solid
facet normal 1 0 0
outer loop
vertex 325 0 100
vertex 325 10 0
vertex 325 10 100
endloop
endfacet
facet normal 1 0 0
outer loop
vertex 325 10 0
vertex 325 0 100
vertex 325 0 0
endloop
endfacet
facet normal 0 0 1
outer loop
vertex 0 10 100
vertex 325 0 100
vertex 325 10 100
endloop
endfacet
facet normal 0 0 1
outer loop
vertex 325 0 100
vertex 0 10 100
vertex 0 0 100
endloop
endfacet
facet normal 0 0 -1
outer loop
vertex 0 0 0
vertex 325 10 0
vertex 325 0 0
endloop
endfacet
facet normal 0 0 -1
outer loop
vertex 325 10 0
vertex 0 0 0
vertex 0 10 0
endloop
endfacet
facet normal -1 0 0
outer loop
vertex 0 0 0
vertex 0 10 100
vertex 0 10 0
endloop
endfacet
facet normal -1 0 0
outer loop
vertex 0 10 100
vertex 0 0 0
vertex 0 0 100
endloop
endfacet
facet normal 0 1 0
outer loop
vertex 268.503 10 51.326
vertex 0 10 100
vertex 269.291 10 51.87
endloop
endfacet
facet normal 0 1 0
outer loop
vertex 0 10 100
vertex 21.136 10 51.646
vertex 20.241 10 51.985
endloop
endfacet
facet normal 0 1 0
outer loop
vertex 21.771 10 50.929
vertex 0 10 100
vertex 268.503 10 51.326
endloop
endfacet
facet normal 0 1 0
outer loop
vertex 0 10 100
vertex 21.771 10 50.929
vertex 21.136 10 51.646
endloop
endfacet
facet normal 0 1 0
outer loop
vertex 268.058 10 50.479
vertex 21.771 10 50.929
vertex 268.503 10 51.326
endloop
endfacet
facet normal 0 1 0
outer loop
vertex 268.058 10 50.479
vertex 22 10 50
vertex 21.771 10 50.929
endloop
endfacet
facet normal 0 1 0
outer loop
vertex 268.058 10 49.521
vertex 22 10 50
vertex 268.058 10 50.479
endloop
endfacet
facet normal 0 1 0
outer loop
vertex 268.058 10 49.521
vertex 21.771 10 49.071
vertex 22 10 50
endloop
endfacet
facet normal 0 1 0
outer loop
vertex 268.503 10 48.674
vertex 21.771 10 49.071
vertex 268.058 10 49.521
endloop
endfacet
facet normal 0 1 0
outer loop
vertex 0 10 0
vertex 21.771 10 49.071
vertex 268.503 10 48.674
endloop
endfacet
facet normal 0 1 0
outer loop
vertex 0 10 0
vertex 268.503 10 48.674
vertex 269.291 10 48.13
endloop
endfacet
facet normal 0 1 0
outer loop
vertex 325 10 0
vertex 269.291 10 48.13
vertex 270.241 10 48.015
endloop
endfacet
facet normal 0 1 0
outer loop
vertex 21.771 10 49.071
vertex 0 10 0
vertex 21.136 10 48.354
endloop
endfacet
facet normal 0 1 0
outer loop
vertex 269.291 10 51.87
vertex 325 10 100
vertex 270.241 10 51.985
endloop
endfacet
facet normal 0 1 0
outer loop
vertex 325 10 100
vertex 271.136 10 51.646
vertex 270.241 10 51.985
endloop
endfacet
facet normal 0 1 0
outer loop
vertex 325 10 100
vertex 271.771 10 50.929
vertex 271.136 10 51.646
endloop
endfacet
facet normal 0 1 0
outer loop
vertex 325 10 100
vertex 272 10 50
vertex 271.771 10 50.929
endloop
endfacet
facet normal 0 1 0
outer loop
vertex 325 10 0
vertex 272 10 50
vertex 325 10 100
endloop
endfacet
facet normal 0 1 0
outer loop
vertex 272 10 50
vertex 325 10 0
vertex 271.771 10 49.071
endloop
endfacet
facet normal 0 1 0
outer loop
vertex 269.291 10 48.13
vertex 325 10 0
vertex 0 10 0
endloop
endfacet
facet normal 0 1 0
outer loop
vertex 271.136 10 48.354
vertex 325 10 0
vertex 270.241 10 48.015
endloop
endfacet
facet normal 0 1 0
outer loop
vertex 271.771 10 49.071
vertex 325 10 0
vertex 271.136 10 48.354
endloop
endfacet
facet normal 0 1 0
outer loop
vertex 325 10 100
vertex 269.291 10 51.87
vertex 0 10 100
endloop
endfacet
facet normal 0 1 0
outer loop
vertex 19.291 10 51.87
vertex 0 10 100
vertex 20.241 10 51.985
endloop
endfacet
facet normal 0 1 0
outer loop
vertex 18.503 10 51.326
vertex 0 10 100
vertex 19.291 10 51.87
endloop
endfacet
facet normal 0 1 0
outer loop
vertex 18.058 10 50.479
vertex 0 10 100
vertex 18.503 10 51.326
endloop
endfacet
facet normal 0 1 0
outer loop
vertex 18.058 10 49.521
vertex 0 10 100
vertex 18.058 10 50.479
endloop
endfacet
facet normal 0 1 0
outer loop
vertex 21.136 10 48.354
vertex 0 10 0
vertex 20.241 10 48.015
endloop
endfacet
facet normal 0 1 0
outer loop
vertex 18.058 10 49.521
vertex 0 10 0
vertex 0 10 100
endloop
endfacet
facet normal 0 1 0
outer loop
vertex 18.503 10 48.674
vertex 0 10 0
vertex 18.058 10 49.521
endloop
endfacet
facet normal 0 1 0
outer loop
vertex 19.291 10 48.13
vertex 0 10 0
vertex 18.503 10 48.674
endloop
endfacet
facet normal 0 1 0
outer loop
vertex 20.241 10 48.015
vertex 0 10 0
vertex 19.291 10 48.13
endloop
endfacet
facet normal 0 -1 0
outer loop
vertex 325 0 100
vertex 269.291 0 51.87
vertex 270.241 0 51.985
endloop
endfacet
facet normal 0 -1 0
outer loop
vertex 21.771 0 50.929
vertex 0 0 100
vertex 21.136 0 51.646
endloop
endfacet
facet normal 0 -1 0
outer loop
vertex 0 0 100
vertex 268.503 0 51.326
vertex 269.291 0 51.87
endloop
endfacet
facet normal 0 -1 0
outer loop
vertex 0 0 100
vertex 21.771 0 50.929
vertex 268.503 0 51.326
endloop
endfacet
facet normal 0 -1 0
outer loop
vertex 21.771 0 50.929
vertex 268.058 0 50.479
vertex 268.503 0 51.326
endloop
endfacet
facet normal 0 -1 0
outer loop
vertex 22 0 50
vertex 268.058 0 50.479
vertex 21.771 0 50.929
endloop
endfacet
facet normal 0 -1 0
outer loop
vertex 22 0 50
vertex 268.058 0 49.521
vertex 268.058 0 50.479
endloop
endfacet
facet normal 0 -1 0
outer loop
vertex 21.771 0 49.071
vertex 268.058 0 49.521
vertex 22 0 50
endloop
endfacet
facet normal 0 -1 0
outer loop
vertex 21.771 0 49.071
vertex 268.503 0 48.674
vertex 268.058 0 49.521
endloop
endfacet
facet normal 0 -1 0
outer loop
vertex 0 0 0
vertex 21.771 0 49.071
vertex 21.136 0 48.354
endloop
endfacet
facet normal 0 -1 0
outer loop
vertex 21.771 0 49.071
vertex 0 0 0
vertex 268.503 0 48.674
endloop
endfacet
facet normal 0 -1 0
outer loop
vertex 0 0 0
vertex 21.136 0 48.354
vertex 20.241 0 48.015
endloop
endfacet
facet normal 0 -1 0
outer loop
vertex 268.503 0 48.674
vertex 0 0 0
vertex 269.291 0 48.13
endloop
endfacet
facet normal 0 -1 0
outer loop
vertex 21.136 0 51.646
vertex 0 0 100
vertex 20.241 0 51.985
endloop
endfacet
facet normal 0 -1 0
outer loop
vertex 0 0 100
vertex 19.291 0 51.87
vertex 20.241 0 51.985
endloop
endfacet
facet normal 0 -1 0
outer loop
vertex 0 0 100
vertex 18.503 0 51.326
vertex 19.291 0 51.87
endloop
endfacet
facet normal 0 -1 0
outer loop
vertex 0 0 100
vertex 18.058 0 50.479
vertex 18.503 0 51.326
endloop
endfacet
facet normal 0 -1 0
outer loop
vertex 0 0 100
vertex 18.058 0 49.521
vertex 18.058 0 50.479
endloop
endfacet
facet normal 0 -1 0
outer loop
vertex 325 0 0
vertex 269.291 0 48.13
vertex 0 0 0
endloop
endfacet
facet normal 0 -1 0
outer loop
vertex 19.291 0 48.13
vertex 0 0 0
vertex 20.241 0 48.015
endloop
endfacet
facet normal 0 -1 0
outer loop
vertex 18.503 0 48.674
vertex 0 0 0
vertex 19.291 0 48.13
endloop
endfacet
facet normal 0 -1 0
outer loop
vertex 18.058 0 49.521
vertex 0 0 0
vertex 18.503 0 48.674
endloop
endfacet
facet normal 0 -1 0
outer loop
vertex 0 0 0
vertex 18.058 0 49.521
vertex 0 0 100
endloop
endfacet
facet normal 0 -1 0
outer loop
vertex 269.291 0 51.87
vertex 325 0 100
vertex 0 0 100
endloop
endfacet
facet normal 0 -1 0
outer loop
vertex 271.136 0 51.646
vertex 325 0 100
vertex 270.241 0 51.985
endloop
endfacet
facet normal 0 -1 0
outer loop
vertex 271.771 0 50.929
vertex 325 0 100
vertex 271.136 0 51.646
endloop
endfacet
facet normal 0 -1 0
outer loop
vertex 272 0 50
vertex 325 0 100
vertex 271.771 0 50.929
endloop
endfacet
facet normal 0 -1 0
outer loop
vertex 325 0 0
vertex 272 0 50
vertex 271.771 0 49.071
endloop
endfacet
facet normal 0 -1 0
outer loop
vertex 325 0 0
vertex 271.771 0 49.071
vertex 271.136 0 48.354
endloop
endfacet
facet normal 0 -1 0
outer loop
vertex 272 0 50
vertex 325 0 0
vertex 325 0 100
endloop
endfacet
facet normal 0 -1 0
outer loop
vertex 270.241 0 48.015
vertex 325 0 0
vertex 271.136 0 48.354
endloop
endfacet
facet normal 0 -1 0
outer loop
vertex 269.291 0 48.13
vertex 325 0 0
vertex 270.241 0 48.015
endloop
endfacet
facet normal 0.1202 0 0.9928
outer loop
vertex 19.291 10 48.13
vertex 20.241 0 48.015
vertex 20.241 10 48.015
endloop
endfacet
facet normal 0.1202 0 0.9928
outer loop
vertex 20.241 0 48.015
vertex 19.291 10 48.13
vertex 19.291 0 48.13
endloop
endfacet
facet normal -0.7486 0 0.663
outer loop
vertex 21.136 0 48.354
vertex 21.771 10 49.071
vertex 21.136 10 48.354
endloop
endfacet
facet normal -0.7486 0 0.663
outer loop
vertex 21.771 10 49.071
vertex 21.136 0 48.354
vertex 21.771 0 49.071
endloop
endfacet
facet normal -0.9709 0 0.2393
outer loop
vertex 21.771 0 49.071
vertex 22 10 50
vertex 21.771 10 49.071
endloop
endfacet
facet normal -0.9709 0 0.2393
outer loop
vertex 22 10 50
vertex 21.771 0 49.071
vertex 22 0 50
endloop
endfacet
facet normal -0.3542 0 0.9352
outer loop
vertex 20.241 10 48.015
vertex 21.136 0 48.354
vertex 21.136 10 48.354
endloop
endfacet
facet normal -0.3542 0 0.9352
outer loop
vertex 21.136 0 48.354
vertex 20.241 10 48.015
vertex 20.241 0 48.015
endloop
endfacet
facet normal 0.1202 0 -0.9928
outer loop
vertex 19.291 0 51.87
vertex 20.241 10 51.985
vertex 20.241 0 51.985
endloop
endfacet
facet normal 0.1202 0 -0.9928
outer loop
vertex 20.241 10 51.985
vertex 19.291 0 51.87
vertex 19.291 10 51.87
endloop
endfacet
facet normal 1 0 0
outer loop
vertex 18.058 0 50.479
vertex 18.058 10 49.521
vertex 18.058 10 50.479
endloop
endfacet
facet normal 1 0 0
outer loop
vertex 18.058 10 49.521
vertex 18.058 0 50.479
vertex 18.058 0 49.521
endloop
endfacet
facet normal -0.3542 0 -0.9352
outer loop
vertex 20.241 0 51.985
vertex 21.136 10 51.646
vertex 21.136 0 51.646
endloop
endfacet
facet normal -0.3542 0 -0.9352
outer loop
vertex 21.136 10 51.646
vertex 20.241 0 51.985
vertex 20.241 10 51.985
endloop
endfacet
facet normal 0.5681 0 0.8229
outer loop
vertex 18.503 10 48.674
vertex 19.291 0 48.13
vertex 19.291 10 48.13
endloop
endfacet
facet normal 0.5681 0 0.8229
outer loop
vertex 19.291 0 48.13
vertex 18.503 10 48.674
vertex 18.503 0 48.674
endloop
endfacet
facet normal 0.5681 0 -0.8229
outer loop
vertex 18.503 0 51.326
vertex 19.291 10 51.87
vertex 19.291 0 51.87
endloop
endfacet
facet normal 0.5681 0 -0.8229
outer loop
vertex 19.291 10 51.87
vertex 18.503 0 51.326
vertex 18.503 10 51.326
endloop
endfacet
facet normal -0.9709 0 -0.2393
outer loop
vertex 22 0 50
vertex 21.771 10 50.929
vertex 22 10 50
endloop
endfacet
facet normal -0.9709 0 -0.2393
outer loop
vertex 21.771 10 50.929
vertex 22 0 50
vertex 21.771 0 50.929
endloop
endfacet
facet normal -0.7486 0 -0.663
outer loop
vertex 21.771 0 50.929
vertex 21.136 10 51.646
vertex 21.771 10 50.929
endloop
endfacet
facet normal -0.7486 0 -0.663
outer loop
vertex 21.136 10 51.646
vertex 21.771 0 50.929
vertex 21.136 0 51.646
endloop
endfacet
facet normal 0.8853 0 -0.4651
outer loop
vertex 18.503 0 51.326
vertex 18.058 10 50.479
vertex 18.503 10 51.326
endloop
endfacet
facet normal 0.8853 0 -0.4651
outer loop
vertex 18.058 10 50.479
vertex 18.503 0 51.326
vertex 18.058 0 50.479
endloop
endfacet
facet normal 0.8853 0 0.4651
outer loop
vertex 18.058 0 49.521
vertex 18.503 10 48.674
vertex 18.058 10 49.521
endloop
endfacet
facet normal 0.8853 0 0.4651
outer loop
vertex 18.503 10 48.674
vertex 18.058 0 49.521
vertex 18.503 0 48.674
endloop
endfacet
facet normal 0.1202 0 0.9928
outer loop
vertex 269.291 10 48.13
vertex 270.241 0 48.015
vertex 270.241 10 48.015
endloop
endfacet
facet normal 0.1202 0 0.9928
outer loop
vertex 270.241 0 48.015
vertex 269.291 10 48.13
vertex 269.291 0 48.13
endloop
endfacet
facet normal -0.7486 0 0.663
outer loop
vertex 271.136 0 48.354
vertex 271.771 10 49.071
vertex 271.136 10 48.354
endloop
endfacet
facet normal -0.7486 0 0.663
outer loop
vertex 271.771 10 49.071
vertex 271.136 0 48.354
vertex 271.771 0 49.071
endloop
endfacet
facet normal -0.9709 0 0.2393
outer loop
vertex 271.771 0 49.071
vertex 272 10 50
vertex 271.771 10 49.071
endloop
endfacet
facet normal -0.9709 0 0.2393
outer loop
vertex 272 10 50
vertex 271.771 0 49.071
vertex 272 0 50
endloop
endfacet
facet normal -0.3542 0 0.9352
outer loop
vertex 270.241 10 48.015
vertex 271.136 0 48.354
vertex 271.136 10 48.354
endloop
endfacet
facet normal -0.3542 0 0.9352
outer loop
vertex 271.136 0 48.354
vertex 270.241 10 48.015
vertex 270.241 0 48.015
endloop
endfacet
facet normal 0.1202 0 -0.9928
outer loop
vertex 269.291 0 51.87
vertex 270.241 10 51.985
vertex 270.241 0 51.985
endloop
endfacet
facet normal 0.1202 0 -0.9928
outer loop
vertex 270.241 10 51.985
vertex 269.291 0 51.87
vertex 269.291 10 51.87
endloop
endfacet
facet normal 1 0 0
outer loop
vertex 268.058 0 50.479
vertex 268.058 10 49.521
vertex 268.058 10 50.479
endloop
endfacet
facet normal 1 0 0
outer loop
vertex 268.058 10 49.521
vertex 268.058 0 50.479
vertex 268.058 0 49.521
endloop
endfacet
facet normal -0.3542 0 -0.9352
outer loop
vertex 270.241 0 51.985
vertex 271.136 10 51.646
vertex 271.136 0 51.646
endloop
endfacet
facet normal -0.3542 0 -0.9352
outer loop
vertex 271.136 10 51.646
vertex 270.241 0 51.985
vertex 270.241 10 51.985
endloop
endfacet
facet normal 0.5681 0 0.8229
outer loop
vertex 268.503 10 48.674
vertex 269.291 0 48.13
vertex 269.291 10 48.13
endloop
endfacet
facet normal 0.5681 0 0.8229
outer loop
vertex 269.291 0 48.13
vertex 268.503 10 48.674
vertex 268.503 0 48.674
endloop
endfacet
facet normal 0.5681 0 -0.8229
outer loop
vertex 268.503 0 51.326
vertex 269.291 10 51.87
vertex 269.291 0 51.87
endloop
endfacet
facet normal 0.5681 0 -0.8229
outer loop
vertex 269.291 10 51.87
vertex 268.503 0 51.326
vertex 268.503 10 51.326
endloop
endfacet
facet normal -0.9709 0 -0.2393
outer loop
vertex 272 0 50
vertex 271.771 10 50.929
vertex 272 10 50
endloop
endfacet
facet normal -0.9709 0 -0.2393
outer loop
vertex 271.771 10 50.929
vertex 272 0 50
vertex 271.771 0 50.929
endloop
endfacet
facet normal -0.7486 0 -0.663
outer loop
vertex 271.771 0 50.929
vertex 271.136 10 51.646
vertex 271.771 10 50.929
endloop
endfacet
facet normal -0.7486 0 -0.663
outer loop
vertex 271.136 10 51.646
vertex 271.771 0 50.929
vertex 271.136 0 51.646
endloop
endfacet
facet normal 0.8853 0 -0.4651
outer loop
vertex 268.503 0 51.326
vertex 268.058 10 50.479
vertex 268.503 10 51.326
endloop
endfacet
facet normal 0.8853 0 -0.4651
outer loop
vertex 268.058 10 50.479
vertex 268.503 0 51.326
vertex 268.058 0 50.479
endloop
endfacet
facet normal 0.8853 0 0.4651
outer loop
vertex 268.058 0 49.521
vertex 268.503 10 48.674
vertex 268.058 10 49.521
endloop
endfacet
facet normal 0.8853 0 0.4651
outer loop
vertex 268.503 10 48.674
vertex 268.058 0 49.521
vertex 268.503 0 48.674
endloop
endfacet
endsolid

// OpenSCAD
// RO/DI Mount Plates
// Designed to be printed on their side and arranged diagonally on a 256x256x256 mm build plate
// These plates will be super glued to the mounting surface on the stand

// ---------- Public parameters (mm) ----------
// Mount plate dimensions (matching stand mounting surface).
mount_width = 100;
mount_thickness = 10; // Thickness in mm - matches stand.scad.

screw_hole_diameter = 2;
screw_hole_vertical_spacing = 250;
screw_hole_top_spacing = 20;

// Plate lengths.
plate_1_length = 325; // First plate length in mm.
plate_2_length = 100; // Second plate length in mm.

// ---------- Resolution ----------
$fa = 1;
$fs = 1;

module screw_hole(hole_diameter) {
  translate([0, -1, 0])
  rotate([-90, 0, 0])
  cylinder(mount_thickness + 2, hole_diameter, hole_diameter);
}

module screw_hole_test() {
  difference() {
    cube([120, mount_thickness, 50]);
    translate([20, 0, 25])
      screw_hole(1.6);
    translate([40, 0, 25])
      screw_hole(1.8);
    translate([60, 0, 25])
      screw_hole(2.0);
    translate([80, 0, 25])
      screw_hole(2.2);
    translate([100, 0, 25])
      screw_hole(2.4);
  }
}

module mount_plate(length) {
  // Mount plate module.
  // When printed on its side, this will have:
  // - Height (Z): mount_thickness (8mm) - layers will be vertical in final assembly.
  // - Width (Y): mount_width (100mm) - matches stand mounting surface.
  // - Length (X): length parameter.
  //
  // For printing: rotate 90 degrees around X axis to lay on its side, then 45 degrees around Z for diagonal.
  difference() {
    cube([length, mount_thickness, mount_width]);
    translate([screw_hole_top_spacing, 0, mount_width / 2])
      screw_hole(screw_hole_diameter);
    translate([screw_hole_top_spacing + screw_hole_vertical_spacing, 0, mount_width / 2])
      screw_hole(screw_hole_diameter);
  }
}

mount_plate(325);
//screw_hole_test();
//screw_hole();
